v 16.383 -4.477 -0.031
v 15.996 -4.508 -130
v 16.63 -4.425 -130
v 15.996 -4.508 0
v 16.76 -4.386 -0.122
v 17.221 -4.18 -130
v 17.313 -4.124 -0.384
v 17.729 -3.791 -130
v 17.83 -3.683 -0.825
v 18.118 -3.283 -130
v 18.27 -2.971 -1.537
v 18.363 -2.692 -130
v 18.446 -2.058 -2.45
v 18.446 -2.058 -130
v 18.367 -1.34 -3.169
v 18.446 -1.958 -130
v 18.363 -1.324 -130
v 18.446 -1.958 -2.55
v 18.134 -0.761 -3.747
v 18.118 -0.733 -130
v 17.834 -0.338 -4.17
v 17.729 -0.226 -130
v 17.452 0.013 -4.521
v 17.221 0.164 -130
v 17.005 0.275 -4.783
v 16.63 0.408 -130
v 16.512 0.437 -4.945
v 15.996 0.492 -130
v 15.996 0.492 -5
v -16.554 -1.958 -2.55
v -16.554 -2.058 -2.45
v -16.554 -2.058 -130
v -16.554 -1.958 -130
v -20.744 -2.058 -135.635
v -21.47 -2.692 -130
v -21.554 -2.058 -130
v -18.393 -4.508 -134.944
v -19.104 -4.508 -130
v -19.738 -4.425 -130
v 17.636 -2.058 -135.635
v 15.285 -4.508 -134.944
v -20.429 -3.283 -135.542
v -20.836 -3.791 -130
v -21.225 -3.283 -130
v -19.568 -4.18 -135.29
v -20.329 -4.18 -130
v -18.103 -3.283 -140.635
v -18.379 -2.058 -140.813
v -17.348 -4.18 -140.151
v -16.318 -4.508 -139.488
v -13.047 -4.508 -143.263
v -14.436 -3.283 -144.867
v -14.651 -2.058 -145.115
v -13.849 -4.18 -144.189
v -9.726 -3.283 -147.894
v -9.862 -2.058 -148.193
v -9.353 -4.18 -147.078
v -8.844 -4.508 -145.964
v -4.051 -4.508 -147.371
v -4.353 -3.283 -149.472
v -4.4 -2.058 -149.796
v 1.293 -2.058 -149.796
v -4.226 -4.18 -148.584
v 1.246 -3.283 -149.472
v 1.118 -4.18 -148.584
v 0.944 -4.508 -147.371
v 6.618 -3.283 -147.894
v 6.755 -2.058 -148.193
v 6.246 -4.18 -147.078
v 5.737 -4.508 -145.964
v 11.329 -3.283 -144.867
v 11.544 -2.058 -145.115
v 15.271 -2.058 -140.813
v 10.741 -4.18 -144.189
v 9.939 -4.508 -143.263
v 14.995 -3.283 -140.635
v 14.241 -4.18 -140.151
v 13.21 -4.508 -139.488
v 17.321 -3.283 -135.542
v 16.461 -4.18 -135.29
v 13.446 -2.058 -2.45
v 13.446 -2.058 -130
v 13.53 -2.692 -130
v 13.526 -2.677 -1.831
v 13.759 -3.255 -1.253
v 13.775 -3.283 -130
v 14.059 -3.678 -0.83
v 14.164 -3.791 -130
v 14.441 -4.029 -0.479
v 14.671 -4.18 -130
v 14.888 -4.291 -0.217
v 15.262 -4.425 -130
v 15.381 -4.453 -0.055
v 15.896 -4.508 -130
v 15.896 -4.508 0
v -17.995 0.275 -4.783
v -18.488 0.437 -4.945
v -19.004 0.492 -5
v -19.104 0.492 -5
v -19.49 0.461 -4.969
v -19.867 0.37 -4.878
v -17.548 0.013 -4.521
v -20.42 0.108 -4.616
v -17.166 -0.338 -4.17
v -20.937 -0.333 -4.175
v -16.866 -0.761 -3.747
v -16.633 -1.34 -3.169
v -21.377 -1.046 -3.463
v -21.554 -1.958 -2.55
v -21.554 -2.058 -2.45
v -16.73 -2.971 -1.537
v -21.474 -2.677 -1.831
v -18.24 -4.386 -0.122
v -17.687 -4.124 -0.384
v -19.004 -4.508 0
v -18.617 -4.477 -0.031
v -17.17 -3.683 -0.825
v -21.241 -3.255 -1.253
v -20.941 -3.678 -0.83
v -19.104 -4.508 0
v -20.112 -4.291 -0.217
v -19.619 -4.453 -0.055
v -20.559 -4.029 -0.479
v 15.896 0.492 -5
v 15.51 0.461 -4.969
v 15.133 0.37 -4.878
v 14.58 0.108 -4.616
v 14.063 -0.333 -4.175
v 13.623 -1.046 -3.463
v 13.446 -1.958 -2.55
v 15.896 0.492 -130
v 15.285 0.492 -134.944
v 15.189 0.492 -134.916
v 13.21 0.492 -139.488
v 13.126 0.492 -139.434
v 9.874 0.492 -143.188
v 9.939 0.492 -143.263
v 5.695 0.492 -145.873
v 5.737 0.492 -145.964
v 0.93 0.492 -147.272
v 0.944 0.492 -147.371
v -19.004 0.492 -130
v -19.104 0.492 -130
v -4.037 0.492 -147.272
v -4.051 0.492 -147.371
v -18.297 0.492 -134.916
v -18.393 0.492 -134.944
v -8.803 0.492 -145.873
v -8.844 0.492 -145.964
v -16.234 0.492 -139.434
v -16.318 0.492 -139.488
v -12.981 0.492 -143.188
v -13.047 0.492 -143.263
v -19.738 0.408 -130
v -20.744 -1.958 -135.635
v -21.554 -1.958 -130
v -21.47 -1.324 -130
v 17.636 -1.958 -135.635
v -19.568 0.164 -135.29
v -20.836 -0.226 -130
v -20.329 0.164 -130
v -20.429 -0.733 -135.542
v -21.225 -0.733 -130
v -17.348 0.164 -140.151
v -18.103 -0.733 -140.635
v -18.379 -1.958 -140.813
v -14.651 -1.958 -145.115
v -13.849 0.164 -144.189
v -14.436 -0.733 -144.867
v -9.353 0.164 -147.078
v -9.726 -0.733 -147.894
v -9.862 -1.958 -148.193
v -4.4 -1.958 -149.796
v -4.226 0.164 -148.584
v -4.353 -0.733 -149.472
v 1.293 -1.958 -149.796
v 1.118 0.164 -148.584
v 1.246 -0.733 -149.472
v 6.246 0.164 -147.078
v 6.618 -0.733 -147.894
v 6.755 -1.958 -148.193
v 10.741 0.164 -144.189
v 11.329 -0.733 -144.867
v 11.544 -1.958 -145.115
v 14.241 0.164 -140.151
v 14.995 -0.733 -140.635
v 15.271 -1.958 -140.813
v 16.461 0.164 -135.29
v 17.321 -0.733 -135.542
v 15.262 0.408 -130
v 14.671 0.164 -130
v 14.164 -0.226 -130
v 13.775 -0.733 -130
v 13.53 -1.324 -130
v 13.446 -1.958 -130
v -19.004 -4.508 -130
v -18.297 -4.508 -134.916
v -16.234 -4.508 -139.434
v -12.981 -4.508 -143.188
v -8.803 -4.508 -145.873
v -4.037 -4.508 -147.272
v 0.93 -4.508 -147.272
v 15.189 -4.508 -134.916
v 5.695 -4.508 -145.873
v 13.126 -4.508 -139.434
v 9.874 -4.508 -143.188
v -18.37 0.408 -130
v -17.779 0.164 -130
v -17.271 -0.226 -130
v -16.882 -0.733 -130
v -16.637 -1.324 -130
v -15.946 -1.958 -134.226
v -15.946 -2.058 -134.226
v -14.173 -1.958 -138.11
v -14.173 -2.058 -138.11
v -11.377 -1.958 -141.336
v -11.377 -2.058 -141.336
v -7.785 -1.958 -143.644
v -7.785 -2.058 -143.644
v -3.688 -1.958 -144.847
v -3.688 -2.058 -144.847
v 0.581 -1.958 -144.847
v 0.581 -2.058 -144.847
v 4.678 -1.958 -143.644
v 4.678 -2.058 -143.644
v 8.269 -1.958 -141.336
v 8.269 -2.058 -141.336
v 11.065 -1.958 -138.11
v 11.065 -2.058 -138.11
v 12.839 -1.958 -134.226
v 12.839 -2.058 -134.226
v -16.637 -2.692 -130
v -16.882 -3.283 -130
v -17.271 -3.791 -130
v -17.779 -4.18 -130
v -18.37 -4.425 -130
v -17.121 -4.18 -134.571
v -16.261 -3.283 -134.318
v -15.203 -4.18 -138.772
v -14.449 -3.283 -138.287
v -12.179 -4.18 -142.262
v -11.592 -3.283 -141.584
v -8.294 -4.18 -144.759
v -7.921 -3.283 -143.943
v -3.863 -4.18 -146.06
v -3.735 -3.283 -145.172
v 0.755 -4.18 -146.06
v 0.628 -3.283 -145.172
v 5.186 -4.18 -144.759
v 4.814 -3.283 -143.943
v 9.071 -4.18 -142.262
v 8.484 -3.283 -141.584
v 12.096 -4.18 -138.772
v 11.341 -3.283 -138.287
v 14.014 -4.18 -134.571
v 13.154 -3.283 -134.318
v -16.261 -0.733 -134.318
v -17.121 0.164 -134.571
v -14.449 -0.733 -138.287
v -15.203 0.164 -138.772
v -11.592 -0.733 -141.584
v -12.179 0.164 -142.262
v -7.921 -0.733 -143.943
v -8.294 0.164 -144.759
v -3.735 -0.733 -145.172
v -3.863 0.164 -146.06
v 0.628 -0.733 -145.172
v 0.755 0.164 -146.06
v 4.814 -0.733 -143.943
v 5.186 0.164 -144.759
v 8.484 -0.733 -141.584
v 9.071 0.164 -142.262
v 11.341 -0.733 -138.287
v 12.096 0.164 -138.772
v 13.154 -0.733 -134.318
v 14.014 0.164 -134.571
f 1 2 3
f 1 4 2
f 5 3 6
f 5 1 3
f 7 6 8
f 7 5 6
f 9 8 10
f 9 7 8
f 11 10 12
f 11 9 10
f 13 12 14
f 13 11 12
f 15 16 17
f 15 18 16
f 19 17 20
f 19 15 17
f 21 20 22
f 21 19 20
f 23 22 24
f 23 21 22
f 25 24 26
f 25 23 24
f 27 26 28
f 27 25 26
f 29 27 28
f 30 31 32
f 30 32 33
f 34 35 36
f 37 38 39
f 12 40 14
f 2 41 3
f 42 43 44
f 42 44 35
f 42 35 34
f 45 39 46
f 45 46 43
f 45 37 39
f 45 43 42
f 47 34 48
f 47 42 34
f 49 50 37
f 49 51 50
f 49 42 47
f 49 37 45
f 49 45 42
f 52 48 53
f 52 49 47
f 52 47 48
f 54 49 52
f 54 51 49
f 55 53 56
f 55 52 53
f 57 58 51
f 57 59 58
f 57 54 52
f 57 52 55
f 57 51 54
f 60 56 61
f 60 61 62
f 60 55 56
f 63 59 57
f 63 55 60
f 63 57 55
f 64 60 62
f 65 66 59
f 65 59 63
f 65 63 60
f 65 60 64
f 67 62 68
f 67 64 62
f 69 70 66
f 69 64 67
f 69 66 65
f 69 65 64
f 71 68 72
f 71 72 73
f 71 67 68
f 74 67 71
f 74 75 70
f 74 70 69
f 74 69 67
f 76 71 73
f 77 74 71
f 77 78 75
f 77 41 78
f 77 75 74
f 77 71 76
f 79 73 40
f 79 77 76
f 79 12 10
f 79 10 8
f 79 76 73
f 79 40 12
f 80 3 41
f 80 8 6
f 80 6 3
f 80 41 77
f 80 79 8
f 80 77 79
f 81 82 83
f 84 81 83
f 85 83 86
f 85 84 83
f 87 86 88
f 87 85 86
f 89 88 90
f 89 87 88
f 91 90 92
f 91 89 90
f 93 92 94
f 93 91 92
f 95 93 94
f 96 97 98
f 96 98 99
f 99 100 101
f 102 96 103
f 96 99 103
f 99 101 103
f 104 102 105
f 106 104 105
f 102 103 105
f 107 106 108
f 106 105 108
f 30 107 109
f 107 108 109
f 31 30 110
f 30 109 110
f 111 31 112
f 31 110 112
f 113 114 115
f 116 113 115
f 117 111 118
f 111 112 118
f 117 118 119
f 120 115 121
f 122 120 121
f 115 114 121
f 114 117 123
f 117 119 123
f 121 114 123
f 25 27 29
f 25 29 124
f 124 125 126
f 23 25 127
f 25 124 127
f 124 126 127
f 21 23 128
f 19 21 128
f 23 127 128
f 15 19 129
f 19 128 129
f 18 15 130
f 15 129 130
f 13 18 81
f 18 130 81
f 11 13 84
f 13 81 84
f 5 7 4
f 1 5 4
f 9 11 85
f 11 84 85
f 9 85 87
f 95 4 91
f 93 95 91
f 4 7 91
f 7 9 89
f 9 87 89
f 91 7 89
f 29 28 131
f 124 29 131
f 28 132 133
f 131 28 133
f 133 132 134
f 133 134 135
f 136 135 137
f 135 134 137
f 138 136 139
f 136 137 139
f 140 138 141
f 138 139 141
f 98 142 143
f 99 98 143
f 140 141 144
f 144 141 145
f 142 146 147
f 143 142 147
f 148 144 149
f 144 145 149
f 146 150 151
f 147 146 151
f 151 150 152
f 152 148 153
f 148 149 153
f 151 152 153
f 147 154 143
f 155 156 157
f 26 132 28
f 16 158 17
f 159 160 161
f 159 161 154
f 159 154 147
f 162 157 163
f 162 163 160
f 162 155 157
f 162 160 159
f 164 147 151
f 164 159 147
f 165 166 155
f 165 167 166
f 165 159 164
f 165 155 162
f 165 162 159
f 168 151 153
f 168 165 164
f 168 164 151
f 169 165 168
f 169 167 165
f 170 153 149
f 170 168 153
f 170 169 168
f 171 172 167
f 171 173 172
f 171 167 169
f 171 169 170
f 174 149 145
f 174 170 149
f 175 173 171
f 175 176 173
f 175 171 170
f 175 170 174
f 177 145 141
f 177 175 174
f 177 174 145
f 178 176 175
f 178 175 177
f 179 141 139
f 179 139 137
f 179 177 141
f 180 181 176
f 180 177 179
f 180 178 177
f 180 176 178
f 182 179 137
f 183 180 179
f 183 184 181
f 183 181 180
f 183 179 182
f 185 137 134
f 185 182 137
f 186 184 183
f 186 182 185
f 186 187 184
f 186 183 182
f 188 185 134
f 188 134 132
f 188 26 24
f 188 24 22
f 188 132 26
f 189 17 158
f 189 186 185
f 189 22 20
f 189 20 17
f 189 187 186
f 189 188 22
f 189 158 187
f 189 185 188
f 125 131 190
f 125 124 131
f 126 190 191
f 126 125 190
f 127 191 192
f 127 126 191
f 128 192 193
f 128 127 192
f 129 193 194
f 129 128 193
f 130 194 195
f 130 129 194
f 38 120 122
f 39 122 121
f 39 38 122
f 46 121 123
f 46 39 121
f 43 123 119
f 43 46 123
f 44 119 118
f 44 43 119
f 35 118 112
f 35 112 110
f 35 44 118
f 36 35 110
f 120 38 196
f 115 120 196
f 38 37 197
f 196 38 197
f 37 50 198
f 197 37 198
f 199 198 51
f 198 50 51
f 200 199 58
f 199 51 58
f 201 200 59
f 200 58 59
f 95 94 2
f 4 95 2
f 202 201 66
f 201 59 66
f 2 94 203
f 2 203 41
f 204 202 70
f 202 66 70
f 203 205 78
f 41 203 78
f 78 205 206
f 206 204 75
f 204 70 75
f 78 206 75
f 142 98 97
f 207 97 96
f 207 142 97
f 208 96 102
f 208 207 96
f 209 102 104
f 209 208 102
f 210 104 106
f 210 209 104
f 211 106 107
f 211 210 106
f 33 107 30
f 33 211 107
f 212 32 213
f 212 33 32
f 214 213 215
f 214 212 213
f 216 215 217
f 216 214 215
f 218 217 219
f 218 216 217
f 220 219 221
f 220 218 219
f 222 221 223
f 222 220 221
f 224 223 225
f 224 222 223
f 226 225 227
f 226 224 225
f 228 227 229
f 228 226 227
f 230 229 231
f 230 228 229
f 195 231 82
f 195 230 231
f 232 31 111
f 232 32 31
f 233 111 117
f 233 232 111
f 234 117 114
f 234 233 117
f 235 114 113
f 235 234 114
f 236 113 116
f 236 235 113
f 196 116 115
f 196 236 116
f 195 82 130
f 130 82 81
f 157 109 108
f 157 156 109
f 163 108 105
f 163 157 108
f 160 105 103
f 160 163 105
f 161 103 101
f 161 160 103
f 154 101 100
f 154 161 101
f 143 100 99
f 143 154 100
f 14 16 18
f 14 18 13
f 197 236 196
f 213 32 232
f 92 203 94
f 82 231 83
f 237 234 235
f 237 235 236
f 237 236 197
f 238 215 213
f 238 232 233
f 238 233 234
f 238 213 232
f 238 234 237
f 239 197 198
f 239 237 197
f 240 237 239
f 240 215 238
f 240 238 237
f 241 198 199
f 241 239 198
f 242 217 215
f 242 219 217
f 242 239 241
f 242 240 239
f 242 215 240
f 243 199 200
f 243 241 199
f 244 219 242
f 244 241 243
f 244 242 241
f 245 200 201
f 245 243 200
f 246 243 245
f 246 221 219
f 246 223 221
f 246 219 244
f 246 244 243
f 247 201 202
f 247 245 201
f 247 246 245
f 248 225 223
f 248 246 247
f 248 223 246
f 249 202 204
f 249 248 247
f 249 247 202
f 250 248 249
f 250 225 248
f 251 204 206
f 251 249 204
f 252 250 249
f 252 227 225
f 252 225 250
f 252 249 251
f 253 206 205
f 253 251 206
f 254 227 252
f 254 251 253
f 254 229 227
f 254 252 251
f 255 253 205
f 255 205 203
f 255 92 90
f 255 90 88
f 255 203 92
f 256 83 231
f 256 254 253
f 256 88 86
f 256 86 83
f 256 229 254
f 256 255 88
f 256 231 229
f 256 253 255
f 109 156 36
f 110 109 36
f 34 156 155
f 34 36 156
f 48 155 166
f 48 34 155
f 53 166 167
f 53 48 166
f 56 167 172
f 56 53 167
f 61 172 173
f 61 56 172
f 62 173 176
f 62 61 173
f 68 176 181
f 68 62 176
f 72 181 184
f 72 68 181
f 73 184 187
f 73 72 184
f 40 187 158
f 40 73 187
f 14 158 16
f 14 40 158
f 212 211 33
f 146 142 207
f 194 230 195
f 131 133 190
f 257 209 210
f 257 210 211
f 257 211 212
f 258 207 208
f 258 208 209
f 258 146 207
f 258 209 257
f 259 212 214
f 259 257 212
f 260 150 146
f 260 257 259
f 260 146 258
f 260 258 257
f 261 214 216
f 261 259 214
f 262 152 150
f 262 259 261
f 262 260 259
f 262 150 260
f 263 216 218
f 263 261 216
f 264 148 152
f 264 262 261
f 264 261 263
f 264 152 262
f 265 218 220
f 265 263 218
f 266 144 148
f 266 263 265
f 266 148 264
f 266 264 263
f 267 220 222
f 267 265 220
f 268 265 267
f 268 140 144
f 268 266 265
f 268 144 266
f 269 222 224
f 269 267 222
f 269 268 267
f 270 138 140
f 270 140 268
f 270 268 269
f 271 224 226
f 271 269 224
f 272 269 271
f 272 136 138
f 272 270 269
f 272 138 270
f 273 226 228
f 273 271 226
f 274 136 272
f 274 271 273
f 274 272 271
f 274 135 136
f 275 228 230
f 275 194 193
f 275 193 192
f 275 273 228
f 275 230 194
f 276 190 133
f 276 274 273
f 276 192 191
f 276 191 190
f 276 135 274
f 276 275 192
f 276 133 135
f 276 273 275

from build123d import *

# Parameters (mm, degrees)
CUT_EXTRUDE_1_DEPTH = 156.307191324


with BuildPart() as part:
    # По траектории1: sweep along a path in Эскиз2
    with BuildLine(Plane(origin=(0, 0, 0), x_dir=(1, 0, 0), z_dir=(0, 1, 0))) as sweep_1_path:
        Line((-19.053699061, 0), (-19.053699061, 130))
        ThreePointArc((-19.053699061, 130), (-1.553699061, 147.5), (15.946300939, 130))
        Line((15.946300939, 130), (15.946300939, 0))
    # Эскиз1 → По траектории1 (sweep)
    with BuildSketch(Plane.XY):
        with BuildLine():
            Line((-19.103699061, 0.491825411), (-19.003699061, 0.491825411))
            ThreePointArc((-19.003699061, 0.491825411), (-17.271287447, -0.225762975), (-16.553699061, -1.958174589))
            Line((-16.553699061, -1.958174589), (-16.553699061, -2.058174589))
            ThreePointArc((-16.553699061, -2.058174589), (-17.271287447, -3.790586203), (-19.003699061, -4.508174589))
            Line((-19.003699061, -4.508174589), (-19.103699061, -4.508174589))
            ThreePointArc((-19.103699061, -4.508174589), (-20.836110675, -3.790586203), (-21.553699061, -2.058174589))
            Line((-21.553699061, -2.058174589), (-21.553699061, -1.958174589))
            ThreePointArc((-21.553699061, -1.958174589), (-20.836110675, -0.225762975), (-19.103699061, 0.491825411))
        make_face()
    sweep(path=sweep_1_path.line)

    # Эскиз3 → Вырез-Вытянуть1 (cut, through all)
    with BuildSketch(Plane.ZY.offset(21.553699061)):
        Polygon((0, 0.491825411), (-5, 0.491825411), (0, -4.508174589), align=None)
    extrude(amount=-CUT_EXTRUDE_1_DEPTH, mode=Mode.SUBTRACT)


solid = part.part
